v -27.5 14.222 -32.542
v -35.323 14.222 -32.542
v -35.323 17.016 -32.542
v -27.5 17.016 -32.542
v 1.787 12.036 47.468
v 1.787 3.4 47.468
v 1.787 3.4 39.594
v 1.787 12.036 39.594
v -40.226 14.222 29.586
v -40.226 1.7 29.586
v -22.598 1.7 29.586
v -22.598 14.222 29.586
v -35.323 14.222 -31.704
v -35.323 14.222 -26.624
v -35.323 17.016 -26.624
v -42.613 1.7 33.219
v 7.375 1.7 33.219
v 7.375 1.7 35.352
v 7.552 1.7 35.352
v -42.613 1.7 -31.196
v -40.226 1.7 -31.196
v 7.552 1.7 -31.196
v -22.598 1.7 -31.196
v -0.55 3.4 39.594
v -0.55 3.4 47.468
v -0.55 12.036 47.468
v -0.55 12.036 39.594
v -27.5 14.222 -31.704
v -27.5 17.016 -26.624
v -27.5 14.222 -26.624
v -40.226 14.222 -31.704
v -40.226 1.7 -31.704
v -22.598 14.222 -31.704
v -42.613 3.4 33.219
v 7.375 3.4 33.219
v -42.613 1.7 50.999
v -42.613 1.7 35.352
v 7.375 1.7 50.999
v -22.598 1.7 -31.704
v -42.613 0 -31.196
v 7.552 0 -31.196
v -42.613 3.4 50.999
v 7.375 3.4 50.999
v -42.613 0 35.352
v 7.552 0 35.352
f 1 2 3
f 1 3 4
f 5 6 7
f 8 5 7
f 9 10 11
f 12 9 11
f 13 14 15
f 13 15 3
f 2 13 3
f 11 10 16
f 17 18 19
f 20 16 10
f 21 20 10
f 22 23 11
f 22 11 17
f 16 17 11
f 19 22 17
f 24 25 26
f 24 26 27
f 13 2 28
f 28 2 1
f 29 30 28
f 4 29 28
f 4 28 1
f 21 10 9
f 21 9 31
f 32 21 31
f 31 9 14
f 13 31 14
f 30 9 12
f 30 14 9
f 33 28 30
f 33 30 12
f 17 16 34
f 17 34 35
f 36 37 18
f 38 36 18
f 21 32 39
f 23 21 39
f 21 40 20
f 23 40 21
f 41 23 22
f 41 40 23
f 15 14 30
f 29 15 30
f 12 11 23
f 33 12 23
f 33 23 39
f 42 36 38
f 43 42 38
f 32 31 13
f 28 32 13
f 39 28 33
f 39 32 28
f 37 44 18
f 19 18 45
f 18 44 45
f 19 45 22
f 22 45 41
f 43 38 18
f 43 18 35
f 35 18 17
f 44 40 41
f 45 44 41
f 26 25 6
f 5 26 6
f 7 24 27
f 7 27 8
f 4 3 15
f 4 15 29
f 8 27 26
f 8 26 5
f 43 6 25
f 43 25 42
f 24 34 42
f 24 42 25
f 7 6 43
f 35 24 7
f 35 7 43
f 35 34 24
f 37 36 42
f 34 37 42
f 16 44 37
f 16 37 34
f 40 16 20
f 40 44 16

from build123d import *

# Parameters (mm, degrees)
SKETCH1_W           = 50.165
SKETCH1_H           = 66.548
BOSS_EXTRUDE1_DEPTH = 1.7
SKETCH2_W           = 49.98833795
SKETCH2_H           = 17.78
BOSS_EXTRUDE2_DEPTH = 1.7
SKETCH3_W           = 17.6276
SKETCH3_H           = 61.2902
BOSS_EXTRUDE3_DEPTH = 12.5222
SKETCH4_W           = 7.8232
SKETCH4_H           = 5.9182
BOSS_EXTRUDE4_DEPTH = 2.794
SKETCH5_W           = 2.3368
SKETCH5_H           = 7.874
BOSS_EXTRUDE5_DEPTH = 8.636


with BuildPart() as part:
    # Sketch1 → Boss-Extrude1 (new body)
    with BuildSketch(Plane(origin=(0, 0, 0), x_dir=(1, 0, 0), z_dir=(0, 1, 0))):
        with Locations((-17.53077957, -2.078202509)):
            Rectangle(SKETCH1_W, SKETCH1_H)
    extrude(amount=BOSS_EXTRUDE1_DEPTH)

    # Sketch2 → Boss-Extrude2 (add)
    with BuildSketch(Plane(origin=(0, 1.7, 0), x_dir=(1, 0, 0), z_dir=(0, 1, 0))):
        with Locations((-17.619110595, -42.108602509)):
            Rectangle(SKETCH2_W, SKETCH2_H)
    extrude(amount=BOSS_EXTRUDE2_DEPTH)

    # Sketch3 → Boss-Extrude3 (add)
    with BuildSketch(Plane(origin=(0, 1.7, 0), x_dir=(1, 0, 0), z_dir=(0, 1, 0))):
        with Locations((-31.41187957, 1.058697491)):
            Rectangle(SKETCH3_W, SKETCH3_H)
    extrude(amount=BOSS_EXTRUDE3_DEPTH)

    # Sketch4 → Boss-Extrude4 (add)
    with BuildSketch(Plane(origin=(0, 14.2222, 0), x_dir=(1, 0, 0), z_dir=(0, 1, 0))):
        with Locations((-31.41187957, 29.582897491)):
            Rectangle(SKETCH4_W, SKETCH4_H)
    extrude(amount=BOSS_EXTRUDE4_DEPTH)

    # Sketch5 → Boss-Extrude5 (add)
    with BuildSketch(Plane(origin=(0, 3.4, 0), x_dir=(1, 0, 0), z_dir=(0, 1, 0))):
        with Locations((0.61865838, -43.531002509)):
            Rectangle(SKETCH5_W, SKETCH5_H)
    extrude(amount=BOSS_EXTRUDE5_DEPTH)


solid = part.part
